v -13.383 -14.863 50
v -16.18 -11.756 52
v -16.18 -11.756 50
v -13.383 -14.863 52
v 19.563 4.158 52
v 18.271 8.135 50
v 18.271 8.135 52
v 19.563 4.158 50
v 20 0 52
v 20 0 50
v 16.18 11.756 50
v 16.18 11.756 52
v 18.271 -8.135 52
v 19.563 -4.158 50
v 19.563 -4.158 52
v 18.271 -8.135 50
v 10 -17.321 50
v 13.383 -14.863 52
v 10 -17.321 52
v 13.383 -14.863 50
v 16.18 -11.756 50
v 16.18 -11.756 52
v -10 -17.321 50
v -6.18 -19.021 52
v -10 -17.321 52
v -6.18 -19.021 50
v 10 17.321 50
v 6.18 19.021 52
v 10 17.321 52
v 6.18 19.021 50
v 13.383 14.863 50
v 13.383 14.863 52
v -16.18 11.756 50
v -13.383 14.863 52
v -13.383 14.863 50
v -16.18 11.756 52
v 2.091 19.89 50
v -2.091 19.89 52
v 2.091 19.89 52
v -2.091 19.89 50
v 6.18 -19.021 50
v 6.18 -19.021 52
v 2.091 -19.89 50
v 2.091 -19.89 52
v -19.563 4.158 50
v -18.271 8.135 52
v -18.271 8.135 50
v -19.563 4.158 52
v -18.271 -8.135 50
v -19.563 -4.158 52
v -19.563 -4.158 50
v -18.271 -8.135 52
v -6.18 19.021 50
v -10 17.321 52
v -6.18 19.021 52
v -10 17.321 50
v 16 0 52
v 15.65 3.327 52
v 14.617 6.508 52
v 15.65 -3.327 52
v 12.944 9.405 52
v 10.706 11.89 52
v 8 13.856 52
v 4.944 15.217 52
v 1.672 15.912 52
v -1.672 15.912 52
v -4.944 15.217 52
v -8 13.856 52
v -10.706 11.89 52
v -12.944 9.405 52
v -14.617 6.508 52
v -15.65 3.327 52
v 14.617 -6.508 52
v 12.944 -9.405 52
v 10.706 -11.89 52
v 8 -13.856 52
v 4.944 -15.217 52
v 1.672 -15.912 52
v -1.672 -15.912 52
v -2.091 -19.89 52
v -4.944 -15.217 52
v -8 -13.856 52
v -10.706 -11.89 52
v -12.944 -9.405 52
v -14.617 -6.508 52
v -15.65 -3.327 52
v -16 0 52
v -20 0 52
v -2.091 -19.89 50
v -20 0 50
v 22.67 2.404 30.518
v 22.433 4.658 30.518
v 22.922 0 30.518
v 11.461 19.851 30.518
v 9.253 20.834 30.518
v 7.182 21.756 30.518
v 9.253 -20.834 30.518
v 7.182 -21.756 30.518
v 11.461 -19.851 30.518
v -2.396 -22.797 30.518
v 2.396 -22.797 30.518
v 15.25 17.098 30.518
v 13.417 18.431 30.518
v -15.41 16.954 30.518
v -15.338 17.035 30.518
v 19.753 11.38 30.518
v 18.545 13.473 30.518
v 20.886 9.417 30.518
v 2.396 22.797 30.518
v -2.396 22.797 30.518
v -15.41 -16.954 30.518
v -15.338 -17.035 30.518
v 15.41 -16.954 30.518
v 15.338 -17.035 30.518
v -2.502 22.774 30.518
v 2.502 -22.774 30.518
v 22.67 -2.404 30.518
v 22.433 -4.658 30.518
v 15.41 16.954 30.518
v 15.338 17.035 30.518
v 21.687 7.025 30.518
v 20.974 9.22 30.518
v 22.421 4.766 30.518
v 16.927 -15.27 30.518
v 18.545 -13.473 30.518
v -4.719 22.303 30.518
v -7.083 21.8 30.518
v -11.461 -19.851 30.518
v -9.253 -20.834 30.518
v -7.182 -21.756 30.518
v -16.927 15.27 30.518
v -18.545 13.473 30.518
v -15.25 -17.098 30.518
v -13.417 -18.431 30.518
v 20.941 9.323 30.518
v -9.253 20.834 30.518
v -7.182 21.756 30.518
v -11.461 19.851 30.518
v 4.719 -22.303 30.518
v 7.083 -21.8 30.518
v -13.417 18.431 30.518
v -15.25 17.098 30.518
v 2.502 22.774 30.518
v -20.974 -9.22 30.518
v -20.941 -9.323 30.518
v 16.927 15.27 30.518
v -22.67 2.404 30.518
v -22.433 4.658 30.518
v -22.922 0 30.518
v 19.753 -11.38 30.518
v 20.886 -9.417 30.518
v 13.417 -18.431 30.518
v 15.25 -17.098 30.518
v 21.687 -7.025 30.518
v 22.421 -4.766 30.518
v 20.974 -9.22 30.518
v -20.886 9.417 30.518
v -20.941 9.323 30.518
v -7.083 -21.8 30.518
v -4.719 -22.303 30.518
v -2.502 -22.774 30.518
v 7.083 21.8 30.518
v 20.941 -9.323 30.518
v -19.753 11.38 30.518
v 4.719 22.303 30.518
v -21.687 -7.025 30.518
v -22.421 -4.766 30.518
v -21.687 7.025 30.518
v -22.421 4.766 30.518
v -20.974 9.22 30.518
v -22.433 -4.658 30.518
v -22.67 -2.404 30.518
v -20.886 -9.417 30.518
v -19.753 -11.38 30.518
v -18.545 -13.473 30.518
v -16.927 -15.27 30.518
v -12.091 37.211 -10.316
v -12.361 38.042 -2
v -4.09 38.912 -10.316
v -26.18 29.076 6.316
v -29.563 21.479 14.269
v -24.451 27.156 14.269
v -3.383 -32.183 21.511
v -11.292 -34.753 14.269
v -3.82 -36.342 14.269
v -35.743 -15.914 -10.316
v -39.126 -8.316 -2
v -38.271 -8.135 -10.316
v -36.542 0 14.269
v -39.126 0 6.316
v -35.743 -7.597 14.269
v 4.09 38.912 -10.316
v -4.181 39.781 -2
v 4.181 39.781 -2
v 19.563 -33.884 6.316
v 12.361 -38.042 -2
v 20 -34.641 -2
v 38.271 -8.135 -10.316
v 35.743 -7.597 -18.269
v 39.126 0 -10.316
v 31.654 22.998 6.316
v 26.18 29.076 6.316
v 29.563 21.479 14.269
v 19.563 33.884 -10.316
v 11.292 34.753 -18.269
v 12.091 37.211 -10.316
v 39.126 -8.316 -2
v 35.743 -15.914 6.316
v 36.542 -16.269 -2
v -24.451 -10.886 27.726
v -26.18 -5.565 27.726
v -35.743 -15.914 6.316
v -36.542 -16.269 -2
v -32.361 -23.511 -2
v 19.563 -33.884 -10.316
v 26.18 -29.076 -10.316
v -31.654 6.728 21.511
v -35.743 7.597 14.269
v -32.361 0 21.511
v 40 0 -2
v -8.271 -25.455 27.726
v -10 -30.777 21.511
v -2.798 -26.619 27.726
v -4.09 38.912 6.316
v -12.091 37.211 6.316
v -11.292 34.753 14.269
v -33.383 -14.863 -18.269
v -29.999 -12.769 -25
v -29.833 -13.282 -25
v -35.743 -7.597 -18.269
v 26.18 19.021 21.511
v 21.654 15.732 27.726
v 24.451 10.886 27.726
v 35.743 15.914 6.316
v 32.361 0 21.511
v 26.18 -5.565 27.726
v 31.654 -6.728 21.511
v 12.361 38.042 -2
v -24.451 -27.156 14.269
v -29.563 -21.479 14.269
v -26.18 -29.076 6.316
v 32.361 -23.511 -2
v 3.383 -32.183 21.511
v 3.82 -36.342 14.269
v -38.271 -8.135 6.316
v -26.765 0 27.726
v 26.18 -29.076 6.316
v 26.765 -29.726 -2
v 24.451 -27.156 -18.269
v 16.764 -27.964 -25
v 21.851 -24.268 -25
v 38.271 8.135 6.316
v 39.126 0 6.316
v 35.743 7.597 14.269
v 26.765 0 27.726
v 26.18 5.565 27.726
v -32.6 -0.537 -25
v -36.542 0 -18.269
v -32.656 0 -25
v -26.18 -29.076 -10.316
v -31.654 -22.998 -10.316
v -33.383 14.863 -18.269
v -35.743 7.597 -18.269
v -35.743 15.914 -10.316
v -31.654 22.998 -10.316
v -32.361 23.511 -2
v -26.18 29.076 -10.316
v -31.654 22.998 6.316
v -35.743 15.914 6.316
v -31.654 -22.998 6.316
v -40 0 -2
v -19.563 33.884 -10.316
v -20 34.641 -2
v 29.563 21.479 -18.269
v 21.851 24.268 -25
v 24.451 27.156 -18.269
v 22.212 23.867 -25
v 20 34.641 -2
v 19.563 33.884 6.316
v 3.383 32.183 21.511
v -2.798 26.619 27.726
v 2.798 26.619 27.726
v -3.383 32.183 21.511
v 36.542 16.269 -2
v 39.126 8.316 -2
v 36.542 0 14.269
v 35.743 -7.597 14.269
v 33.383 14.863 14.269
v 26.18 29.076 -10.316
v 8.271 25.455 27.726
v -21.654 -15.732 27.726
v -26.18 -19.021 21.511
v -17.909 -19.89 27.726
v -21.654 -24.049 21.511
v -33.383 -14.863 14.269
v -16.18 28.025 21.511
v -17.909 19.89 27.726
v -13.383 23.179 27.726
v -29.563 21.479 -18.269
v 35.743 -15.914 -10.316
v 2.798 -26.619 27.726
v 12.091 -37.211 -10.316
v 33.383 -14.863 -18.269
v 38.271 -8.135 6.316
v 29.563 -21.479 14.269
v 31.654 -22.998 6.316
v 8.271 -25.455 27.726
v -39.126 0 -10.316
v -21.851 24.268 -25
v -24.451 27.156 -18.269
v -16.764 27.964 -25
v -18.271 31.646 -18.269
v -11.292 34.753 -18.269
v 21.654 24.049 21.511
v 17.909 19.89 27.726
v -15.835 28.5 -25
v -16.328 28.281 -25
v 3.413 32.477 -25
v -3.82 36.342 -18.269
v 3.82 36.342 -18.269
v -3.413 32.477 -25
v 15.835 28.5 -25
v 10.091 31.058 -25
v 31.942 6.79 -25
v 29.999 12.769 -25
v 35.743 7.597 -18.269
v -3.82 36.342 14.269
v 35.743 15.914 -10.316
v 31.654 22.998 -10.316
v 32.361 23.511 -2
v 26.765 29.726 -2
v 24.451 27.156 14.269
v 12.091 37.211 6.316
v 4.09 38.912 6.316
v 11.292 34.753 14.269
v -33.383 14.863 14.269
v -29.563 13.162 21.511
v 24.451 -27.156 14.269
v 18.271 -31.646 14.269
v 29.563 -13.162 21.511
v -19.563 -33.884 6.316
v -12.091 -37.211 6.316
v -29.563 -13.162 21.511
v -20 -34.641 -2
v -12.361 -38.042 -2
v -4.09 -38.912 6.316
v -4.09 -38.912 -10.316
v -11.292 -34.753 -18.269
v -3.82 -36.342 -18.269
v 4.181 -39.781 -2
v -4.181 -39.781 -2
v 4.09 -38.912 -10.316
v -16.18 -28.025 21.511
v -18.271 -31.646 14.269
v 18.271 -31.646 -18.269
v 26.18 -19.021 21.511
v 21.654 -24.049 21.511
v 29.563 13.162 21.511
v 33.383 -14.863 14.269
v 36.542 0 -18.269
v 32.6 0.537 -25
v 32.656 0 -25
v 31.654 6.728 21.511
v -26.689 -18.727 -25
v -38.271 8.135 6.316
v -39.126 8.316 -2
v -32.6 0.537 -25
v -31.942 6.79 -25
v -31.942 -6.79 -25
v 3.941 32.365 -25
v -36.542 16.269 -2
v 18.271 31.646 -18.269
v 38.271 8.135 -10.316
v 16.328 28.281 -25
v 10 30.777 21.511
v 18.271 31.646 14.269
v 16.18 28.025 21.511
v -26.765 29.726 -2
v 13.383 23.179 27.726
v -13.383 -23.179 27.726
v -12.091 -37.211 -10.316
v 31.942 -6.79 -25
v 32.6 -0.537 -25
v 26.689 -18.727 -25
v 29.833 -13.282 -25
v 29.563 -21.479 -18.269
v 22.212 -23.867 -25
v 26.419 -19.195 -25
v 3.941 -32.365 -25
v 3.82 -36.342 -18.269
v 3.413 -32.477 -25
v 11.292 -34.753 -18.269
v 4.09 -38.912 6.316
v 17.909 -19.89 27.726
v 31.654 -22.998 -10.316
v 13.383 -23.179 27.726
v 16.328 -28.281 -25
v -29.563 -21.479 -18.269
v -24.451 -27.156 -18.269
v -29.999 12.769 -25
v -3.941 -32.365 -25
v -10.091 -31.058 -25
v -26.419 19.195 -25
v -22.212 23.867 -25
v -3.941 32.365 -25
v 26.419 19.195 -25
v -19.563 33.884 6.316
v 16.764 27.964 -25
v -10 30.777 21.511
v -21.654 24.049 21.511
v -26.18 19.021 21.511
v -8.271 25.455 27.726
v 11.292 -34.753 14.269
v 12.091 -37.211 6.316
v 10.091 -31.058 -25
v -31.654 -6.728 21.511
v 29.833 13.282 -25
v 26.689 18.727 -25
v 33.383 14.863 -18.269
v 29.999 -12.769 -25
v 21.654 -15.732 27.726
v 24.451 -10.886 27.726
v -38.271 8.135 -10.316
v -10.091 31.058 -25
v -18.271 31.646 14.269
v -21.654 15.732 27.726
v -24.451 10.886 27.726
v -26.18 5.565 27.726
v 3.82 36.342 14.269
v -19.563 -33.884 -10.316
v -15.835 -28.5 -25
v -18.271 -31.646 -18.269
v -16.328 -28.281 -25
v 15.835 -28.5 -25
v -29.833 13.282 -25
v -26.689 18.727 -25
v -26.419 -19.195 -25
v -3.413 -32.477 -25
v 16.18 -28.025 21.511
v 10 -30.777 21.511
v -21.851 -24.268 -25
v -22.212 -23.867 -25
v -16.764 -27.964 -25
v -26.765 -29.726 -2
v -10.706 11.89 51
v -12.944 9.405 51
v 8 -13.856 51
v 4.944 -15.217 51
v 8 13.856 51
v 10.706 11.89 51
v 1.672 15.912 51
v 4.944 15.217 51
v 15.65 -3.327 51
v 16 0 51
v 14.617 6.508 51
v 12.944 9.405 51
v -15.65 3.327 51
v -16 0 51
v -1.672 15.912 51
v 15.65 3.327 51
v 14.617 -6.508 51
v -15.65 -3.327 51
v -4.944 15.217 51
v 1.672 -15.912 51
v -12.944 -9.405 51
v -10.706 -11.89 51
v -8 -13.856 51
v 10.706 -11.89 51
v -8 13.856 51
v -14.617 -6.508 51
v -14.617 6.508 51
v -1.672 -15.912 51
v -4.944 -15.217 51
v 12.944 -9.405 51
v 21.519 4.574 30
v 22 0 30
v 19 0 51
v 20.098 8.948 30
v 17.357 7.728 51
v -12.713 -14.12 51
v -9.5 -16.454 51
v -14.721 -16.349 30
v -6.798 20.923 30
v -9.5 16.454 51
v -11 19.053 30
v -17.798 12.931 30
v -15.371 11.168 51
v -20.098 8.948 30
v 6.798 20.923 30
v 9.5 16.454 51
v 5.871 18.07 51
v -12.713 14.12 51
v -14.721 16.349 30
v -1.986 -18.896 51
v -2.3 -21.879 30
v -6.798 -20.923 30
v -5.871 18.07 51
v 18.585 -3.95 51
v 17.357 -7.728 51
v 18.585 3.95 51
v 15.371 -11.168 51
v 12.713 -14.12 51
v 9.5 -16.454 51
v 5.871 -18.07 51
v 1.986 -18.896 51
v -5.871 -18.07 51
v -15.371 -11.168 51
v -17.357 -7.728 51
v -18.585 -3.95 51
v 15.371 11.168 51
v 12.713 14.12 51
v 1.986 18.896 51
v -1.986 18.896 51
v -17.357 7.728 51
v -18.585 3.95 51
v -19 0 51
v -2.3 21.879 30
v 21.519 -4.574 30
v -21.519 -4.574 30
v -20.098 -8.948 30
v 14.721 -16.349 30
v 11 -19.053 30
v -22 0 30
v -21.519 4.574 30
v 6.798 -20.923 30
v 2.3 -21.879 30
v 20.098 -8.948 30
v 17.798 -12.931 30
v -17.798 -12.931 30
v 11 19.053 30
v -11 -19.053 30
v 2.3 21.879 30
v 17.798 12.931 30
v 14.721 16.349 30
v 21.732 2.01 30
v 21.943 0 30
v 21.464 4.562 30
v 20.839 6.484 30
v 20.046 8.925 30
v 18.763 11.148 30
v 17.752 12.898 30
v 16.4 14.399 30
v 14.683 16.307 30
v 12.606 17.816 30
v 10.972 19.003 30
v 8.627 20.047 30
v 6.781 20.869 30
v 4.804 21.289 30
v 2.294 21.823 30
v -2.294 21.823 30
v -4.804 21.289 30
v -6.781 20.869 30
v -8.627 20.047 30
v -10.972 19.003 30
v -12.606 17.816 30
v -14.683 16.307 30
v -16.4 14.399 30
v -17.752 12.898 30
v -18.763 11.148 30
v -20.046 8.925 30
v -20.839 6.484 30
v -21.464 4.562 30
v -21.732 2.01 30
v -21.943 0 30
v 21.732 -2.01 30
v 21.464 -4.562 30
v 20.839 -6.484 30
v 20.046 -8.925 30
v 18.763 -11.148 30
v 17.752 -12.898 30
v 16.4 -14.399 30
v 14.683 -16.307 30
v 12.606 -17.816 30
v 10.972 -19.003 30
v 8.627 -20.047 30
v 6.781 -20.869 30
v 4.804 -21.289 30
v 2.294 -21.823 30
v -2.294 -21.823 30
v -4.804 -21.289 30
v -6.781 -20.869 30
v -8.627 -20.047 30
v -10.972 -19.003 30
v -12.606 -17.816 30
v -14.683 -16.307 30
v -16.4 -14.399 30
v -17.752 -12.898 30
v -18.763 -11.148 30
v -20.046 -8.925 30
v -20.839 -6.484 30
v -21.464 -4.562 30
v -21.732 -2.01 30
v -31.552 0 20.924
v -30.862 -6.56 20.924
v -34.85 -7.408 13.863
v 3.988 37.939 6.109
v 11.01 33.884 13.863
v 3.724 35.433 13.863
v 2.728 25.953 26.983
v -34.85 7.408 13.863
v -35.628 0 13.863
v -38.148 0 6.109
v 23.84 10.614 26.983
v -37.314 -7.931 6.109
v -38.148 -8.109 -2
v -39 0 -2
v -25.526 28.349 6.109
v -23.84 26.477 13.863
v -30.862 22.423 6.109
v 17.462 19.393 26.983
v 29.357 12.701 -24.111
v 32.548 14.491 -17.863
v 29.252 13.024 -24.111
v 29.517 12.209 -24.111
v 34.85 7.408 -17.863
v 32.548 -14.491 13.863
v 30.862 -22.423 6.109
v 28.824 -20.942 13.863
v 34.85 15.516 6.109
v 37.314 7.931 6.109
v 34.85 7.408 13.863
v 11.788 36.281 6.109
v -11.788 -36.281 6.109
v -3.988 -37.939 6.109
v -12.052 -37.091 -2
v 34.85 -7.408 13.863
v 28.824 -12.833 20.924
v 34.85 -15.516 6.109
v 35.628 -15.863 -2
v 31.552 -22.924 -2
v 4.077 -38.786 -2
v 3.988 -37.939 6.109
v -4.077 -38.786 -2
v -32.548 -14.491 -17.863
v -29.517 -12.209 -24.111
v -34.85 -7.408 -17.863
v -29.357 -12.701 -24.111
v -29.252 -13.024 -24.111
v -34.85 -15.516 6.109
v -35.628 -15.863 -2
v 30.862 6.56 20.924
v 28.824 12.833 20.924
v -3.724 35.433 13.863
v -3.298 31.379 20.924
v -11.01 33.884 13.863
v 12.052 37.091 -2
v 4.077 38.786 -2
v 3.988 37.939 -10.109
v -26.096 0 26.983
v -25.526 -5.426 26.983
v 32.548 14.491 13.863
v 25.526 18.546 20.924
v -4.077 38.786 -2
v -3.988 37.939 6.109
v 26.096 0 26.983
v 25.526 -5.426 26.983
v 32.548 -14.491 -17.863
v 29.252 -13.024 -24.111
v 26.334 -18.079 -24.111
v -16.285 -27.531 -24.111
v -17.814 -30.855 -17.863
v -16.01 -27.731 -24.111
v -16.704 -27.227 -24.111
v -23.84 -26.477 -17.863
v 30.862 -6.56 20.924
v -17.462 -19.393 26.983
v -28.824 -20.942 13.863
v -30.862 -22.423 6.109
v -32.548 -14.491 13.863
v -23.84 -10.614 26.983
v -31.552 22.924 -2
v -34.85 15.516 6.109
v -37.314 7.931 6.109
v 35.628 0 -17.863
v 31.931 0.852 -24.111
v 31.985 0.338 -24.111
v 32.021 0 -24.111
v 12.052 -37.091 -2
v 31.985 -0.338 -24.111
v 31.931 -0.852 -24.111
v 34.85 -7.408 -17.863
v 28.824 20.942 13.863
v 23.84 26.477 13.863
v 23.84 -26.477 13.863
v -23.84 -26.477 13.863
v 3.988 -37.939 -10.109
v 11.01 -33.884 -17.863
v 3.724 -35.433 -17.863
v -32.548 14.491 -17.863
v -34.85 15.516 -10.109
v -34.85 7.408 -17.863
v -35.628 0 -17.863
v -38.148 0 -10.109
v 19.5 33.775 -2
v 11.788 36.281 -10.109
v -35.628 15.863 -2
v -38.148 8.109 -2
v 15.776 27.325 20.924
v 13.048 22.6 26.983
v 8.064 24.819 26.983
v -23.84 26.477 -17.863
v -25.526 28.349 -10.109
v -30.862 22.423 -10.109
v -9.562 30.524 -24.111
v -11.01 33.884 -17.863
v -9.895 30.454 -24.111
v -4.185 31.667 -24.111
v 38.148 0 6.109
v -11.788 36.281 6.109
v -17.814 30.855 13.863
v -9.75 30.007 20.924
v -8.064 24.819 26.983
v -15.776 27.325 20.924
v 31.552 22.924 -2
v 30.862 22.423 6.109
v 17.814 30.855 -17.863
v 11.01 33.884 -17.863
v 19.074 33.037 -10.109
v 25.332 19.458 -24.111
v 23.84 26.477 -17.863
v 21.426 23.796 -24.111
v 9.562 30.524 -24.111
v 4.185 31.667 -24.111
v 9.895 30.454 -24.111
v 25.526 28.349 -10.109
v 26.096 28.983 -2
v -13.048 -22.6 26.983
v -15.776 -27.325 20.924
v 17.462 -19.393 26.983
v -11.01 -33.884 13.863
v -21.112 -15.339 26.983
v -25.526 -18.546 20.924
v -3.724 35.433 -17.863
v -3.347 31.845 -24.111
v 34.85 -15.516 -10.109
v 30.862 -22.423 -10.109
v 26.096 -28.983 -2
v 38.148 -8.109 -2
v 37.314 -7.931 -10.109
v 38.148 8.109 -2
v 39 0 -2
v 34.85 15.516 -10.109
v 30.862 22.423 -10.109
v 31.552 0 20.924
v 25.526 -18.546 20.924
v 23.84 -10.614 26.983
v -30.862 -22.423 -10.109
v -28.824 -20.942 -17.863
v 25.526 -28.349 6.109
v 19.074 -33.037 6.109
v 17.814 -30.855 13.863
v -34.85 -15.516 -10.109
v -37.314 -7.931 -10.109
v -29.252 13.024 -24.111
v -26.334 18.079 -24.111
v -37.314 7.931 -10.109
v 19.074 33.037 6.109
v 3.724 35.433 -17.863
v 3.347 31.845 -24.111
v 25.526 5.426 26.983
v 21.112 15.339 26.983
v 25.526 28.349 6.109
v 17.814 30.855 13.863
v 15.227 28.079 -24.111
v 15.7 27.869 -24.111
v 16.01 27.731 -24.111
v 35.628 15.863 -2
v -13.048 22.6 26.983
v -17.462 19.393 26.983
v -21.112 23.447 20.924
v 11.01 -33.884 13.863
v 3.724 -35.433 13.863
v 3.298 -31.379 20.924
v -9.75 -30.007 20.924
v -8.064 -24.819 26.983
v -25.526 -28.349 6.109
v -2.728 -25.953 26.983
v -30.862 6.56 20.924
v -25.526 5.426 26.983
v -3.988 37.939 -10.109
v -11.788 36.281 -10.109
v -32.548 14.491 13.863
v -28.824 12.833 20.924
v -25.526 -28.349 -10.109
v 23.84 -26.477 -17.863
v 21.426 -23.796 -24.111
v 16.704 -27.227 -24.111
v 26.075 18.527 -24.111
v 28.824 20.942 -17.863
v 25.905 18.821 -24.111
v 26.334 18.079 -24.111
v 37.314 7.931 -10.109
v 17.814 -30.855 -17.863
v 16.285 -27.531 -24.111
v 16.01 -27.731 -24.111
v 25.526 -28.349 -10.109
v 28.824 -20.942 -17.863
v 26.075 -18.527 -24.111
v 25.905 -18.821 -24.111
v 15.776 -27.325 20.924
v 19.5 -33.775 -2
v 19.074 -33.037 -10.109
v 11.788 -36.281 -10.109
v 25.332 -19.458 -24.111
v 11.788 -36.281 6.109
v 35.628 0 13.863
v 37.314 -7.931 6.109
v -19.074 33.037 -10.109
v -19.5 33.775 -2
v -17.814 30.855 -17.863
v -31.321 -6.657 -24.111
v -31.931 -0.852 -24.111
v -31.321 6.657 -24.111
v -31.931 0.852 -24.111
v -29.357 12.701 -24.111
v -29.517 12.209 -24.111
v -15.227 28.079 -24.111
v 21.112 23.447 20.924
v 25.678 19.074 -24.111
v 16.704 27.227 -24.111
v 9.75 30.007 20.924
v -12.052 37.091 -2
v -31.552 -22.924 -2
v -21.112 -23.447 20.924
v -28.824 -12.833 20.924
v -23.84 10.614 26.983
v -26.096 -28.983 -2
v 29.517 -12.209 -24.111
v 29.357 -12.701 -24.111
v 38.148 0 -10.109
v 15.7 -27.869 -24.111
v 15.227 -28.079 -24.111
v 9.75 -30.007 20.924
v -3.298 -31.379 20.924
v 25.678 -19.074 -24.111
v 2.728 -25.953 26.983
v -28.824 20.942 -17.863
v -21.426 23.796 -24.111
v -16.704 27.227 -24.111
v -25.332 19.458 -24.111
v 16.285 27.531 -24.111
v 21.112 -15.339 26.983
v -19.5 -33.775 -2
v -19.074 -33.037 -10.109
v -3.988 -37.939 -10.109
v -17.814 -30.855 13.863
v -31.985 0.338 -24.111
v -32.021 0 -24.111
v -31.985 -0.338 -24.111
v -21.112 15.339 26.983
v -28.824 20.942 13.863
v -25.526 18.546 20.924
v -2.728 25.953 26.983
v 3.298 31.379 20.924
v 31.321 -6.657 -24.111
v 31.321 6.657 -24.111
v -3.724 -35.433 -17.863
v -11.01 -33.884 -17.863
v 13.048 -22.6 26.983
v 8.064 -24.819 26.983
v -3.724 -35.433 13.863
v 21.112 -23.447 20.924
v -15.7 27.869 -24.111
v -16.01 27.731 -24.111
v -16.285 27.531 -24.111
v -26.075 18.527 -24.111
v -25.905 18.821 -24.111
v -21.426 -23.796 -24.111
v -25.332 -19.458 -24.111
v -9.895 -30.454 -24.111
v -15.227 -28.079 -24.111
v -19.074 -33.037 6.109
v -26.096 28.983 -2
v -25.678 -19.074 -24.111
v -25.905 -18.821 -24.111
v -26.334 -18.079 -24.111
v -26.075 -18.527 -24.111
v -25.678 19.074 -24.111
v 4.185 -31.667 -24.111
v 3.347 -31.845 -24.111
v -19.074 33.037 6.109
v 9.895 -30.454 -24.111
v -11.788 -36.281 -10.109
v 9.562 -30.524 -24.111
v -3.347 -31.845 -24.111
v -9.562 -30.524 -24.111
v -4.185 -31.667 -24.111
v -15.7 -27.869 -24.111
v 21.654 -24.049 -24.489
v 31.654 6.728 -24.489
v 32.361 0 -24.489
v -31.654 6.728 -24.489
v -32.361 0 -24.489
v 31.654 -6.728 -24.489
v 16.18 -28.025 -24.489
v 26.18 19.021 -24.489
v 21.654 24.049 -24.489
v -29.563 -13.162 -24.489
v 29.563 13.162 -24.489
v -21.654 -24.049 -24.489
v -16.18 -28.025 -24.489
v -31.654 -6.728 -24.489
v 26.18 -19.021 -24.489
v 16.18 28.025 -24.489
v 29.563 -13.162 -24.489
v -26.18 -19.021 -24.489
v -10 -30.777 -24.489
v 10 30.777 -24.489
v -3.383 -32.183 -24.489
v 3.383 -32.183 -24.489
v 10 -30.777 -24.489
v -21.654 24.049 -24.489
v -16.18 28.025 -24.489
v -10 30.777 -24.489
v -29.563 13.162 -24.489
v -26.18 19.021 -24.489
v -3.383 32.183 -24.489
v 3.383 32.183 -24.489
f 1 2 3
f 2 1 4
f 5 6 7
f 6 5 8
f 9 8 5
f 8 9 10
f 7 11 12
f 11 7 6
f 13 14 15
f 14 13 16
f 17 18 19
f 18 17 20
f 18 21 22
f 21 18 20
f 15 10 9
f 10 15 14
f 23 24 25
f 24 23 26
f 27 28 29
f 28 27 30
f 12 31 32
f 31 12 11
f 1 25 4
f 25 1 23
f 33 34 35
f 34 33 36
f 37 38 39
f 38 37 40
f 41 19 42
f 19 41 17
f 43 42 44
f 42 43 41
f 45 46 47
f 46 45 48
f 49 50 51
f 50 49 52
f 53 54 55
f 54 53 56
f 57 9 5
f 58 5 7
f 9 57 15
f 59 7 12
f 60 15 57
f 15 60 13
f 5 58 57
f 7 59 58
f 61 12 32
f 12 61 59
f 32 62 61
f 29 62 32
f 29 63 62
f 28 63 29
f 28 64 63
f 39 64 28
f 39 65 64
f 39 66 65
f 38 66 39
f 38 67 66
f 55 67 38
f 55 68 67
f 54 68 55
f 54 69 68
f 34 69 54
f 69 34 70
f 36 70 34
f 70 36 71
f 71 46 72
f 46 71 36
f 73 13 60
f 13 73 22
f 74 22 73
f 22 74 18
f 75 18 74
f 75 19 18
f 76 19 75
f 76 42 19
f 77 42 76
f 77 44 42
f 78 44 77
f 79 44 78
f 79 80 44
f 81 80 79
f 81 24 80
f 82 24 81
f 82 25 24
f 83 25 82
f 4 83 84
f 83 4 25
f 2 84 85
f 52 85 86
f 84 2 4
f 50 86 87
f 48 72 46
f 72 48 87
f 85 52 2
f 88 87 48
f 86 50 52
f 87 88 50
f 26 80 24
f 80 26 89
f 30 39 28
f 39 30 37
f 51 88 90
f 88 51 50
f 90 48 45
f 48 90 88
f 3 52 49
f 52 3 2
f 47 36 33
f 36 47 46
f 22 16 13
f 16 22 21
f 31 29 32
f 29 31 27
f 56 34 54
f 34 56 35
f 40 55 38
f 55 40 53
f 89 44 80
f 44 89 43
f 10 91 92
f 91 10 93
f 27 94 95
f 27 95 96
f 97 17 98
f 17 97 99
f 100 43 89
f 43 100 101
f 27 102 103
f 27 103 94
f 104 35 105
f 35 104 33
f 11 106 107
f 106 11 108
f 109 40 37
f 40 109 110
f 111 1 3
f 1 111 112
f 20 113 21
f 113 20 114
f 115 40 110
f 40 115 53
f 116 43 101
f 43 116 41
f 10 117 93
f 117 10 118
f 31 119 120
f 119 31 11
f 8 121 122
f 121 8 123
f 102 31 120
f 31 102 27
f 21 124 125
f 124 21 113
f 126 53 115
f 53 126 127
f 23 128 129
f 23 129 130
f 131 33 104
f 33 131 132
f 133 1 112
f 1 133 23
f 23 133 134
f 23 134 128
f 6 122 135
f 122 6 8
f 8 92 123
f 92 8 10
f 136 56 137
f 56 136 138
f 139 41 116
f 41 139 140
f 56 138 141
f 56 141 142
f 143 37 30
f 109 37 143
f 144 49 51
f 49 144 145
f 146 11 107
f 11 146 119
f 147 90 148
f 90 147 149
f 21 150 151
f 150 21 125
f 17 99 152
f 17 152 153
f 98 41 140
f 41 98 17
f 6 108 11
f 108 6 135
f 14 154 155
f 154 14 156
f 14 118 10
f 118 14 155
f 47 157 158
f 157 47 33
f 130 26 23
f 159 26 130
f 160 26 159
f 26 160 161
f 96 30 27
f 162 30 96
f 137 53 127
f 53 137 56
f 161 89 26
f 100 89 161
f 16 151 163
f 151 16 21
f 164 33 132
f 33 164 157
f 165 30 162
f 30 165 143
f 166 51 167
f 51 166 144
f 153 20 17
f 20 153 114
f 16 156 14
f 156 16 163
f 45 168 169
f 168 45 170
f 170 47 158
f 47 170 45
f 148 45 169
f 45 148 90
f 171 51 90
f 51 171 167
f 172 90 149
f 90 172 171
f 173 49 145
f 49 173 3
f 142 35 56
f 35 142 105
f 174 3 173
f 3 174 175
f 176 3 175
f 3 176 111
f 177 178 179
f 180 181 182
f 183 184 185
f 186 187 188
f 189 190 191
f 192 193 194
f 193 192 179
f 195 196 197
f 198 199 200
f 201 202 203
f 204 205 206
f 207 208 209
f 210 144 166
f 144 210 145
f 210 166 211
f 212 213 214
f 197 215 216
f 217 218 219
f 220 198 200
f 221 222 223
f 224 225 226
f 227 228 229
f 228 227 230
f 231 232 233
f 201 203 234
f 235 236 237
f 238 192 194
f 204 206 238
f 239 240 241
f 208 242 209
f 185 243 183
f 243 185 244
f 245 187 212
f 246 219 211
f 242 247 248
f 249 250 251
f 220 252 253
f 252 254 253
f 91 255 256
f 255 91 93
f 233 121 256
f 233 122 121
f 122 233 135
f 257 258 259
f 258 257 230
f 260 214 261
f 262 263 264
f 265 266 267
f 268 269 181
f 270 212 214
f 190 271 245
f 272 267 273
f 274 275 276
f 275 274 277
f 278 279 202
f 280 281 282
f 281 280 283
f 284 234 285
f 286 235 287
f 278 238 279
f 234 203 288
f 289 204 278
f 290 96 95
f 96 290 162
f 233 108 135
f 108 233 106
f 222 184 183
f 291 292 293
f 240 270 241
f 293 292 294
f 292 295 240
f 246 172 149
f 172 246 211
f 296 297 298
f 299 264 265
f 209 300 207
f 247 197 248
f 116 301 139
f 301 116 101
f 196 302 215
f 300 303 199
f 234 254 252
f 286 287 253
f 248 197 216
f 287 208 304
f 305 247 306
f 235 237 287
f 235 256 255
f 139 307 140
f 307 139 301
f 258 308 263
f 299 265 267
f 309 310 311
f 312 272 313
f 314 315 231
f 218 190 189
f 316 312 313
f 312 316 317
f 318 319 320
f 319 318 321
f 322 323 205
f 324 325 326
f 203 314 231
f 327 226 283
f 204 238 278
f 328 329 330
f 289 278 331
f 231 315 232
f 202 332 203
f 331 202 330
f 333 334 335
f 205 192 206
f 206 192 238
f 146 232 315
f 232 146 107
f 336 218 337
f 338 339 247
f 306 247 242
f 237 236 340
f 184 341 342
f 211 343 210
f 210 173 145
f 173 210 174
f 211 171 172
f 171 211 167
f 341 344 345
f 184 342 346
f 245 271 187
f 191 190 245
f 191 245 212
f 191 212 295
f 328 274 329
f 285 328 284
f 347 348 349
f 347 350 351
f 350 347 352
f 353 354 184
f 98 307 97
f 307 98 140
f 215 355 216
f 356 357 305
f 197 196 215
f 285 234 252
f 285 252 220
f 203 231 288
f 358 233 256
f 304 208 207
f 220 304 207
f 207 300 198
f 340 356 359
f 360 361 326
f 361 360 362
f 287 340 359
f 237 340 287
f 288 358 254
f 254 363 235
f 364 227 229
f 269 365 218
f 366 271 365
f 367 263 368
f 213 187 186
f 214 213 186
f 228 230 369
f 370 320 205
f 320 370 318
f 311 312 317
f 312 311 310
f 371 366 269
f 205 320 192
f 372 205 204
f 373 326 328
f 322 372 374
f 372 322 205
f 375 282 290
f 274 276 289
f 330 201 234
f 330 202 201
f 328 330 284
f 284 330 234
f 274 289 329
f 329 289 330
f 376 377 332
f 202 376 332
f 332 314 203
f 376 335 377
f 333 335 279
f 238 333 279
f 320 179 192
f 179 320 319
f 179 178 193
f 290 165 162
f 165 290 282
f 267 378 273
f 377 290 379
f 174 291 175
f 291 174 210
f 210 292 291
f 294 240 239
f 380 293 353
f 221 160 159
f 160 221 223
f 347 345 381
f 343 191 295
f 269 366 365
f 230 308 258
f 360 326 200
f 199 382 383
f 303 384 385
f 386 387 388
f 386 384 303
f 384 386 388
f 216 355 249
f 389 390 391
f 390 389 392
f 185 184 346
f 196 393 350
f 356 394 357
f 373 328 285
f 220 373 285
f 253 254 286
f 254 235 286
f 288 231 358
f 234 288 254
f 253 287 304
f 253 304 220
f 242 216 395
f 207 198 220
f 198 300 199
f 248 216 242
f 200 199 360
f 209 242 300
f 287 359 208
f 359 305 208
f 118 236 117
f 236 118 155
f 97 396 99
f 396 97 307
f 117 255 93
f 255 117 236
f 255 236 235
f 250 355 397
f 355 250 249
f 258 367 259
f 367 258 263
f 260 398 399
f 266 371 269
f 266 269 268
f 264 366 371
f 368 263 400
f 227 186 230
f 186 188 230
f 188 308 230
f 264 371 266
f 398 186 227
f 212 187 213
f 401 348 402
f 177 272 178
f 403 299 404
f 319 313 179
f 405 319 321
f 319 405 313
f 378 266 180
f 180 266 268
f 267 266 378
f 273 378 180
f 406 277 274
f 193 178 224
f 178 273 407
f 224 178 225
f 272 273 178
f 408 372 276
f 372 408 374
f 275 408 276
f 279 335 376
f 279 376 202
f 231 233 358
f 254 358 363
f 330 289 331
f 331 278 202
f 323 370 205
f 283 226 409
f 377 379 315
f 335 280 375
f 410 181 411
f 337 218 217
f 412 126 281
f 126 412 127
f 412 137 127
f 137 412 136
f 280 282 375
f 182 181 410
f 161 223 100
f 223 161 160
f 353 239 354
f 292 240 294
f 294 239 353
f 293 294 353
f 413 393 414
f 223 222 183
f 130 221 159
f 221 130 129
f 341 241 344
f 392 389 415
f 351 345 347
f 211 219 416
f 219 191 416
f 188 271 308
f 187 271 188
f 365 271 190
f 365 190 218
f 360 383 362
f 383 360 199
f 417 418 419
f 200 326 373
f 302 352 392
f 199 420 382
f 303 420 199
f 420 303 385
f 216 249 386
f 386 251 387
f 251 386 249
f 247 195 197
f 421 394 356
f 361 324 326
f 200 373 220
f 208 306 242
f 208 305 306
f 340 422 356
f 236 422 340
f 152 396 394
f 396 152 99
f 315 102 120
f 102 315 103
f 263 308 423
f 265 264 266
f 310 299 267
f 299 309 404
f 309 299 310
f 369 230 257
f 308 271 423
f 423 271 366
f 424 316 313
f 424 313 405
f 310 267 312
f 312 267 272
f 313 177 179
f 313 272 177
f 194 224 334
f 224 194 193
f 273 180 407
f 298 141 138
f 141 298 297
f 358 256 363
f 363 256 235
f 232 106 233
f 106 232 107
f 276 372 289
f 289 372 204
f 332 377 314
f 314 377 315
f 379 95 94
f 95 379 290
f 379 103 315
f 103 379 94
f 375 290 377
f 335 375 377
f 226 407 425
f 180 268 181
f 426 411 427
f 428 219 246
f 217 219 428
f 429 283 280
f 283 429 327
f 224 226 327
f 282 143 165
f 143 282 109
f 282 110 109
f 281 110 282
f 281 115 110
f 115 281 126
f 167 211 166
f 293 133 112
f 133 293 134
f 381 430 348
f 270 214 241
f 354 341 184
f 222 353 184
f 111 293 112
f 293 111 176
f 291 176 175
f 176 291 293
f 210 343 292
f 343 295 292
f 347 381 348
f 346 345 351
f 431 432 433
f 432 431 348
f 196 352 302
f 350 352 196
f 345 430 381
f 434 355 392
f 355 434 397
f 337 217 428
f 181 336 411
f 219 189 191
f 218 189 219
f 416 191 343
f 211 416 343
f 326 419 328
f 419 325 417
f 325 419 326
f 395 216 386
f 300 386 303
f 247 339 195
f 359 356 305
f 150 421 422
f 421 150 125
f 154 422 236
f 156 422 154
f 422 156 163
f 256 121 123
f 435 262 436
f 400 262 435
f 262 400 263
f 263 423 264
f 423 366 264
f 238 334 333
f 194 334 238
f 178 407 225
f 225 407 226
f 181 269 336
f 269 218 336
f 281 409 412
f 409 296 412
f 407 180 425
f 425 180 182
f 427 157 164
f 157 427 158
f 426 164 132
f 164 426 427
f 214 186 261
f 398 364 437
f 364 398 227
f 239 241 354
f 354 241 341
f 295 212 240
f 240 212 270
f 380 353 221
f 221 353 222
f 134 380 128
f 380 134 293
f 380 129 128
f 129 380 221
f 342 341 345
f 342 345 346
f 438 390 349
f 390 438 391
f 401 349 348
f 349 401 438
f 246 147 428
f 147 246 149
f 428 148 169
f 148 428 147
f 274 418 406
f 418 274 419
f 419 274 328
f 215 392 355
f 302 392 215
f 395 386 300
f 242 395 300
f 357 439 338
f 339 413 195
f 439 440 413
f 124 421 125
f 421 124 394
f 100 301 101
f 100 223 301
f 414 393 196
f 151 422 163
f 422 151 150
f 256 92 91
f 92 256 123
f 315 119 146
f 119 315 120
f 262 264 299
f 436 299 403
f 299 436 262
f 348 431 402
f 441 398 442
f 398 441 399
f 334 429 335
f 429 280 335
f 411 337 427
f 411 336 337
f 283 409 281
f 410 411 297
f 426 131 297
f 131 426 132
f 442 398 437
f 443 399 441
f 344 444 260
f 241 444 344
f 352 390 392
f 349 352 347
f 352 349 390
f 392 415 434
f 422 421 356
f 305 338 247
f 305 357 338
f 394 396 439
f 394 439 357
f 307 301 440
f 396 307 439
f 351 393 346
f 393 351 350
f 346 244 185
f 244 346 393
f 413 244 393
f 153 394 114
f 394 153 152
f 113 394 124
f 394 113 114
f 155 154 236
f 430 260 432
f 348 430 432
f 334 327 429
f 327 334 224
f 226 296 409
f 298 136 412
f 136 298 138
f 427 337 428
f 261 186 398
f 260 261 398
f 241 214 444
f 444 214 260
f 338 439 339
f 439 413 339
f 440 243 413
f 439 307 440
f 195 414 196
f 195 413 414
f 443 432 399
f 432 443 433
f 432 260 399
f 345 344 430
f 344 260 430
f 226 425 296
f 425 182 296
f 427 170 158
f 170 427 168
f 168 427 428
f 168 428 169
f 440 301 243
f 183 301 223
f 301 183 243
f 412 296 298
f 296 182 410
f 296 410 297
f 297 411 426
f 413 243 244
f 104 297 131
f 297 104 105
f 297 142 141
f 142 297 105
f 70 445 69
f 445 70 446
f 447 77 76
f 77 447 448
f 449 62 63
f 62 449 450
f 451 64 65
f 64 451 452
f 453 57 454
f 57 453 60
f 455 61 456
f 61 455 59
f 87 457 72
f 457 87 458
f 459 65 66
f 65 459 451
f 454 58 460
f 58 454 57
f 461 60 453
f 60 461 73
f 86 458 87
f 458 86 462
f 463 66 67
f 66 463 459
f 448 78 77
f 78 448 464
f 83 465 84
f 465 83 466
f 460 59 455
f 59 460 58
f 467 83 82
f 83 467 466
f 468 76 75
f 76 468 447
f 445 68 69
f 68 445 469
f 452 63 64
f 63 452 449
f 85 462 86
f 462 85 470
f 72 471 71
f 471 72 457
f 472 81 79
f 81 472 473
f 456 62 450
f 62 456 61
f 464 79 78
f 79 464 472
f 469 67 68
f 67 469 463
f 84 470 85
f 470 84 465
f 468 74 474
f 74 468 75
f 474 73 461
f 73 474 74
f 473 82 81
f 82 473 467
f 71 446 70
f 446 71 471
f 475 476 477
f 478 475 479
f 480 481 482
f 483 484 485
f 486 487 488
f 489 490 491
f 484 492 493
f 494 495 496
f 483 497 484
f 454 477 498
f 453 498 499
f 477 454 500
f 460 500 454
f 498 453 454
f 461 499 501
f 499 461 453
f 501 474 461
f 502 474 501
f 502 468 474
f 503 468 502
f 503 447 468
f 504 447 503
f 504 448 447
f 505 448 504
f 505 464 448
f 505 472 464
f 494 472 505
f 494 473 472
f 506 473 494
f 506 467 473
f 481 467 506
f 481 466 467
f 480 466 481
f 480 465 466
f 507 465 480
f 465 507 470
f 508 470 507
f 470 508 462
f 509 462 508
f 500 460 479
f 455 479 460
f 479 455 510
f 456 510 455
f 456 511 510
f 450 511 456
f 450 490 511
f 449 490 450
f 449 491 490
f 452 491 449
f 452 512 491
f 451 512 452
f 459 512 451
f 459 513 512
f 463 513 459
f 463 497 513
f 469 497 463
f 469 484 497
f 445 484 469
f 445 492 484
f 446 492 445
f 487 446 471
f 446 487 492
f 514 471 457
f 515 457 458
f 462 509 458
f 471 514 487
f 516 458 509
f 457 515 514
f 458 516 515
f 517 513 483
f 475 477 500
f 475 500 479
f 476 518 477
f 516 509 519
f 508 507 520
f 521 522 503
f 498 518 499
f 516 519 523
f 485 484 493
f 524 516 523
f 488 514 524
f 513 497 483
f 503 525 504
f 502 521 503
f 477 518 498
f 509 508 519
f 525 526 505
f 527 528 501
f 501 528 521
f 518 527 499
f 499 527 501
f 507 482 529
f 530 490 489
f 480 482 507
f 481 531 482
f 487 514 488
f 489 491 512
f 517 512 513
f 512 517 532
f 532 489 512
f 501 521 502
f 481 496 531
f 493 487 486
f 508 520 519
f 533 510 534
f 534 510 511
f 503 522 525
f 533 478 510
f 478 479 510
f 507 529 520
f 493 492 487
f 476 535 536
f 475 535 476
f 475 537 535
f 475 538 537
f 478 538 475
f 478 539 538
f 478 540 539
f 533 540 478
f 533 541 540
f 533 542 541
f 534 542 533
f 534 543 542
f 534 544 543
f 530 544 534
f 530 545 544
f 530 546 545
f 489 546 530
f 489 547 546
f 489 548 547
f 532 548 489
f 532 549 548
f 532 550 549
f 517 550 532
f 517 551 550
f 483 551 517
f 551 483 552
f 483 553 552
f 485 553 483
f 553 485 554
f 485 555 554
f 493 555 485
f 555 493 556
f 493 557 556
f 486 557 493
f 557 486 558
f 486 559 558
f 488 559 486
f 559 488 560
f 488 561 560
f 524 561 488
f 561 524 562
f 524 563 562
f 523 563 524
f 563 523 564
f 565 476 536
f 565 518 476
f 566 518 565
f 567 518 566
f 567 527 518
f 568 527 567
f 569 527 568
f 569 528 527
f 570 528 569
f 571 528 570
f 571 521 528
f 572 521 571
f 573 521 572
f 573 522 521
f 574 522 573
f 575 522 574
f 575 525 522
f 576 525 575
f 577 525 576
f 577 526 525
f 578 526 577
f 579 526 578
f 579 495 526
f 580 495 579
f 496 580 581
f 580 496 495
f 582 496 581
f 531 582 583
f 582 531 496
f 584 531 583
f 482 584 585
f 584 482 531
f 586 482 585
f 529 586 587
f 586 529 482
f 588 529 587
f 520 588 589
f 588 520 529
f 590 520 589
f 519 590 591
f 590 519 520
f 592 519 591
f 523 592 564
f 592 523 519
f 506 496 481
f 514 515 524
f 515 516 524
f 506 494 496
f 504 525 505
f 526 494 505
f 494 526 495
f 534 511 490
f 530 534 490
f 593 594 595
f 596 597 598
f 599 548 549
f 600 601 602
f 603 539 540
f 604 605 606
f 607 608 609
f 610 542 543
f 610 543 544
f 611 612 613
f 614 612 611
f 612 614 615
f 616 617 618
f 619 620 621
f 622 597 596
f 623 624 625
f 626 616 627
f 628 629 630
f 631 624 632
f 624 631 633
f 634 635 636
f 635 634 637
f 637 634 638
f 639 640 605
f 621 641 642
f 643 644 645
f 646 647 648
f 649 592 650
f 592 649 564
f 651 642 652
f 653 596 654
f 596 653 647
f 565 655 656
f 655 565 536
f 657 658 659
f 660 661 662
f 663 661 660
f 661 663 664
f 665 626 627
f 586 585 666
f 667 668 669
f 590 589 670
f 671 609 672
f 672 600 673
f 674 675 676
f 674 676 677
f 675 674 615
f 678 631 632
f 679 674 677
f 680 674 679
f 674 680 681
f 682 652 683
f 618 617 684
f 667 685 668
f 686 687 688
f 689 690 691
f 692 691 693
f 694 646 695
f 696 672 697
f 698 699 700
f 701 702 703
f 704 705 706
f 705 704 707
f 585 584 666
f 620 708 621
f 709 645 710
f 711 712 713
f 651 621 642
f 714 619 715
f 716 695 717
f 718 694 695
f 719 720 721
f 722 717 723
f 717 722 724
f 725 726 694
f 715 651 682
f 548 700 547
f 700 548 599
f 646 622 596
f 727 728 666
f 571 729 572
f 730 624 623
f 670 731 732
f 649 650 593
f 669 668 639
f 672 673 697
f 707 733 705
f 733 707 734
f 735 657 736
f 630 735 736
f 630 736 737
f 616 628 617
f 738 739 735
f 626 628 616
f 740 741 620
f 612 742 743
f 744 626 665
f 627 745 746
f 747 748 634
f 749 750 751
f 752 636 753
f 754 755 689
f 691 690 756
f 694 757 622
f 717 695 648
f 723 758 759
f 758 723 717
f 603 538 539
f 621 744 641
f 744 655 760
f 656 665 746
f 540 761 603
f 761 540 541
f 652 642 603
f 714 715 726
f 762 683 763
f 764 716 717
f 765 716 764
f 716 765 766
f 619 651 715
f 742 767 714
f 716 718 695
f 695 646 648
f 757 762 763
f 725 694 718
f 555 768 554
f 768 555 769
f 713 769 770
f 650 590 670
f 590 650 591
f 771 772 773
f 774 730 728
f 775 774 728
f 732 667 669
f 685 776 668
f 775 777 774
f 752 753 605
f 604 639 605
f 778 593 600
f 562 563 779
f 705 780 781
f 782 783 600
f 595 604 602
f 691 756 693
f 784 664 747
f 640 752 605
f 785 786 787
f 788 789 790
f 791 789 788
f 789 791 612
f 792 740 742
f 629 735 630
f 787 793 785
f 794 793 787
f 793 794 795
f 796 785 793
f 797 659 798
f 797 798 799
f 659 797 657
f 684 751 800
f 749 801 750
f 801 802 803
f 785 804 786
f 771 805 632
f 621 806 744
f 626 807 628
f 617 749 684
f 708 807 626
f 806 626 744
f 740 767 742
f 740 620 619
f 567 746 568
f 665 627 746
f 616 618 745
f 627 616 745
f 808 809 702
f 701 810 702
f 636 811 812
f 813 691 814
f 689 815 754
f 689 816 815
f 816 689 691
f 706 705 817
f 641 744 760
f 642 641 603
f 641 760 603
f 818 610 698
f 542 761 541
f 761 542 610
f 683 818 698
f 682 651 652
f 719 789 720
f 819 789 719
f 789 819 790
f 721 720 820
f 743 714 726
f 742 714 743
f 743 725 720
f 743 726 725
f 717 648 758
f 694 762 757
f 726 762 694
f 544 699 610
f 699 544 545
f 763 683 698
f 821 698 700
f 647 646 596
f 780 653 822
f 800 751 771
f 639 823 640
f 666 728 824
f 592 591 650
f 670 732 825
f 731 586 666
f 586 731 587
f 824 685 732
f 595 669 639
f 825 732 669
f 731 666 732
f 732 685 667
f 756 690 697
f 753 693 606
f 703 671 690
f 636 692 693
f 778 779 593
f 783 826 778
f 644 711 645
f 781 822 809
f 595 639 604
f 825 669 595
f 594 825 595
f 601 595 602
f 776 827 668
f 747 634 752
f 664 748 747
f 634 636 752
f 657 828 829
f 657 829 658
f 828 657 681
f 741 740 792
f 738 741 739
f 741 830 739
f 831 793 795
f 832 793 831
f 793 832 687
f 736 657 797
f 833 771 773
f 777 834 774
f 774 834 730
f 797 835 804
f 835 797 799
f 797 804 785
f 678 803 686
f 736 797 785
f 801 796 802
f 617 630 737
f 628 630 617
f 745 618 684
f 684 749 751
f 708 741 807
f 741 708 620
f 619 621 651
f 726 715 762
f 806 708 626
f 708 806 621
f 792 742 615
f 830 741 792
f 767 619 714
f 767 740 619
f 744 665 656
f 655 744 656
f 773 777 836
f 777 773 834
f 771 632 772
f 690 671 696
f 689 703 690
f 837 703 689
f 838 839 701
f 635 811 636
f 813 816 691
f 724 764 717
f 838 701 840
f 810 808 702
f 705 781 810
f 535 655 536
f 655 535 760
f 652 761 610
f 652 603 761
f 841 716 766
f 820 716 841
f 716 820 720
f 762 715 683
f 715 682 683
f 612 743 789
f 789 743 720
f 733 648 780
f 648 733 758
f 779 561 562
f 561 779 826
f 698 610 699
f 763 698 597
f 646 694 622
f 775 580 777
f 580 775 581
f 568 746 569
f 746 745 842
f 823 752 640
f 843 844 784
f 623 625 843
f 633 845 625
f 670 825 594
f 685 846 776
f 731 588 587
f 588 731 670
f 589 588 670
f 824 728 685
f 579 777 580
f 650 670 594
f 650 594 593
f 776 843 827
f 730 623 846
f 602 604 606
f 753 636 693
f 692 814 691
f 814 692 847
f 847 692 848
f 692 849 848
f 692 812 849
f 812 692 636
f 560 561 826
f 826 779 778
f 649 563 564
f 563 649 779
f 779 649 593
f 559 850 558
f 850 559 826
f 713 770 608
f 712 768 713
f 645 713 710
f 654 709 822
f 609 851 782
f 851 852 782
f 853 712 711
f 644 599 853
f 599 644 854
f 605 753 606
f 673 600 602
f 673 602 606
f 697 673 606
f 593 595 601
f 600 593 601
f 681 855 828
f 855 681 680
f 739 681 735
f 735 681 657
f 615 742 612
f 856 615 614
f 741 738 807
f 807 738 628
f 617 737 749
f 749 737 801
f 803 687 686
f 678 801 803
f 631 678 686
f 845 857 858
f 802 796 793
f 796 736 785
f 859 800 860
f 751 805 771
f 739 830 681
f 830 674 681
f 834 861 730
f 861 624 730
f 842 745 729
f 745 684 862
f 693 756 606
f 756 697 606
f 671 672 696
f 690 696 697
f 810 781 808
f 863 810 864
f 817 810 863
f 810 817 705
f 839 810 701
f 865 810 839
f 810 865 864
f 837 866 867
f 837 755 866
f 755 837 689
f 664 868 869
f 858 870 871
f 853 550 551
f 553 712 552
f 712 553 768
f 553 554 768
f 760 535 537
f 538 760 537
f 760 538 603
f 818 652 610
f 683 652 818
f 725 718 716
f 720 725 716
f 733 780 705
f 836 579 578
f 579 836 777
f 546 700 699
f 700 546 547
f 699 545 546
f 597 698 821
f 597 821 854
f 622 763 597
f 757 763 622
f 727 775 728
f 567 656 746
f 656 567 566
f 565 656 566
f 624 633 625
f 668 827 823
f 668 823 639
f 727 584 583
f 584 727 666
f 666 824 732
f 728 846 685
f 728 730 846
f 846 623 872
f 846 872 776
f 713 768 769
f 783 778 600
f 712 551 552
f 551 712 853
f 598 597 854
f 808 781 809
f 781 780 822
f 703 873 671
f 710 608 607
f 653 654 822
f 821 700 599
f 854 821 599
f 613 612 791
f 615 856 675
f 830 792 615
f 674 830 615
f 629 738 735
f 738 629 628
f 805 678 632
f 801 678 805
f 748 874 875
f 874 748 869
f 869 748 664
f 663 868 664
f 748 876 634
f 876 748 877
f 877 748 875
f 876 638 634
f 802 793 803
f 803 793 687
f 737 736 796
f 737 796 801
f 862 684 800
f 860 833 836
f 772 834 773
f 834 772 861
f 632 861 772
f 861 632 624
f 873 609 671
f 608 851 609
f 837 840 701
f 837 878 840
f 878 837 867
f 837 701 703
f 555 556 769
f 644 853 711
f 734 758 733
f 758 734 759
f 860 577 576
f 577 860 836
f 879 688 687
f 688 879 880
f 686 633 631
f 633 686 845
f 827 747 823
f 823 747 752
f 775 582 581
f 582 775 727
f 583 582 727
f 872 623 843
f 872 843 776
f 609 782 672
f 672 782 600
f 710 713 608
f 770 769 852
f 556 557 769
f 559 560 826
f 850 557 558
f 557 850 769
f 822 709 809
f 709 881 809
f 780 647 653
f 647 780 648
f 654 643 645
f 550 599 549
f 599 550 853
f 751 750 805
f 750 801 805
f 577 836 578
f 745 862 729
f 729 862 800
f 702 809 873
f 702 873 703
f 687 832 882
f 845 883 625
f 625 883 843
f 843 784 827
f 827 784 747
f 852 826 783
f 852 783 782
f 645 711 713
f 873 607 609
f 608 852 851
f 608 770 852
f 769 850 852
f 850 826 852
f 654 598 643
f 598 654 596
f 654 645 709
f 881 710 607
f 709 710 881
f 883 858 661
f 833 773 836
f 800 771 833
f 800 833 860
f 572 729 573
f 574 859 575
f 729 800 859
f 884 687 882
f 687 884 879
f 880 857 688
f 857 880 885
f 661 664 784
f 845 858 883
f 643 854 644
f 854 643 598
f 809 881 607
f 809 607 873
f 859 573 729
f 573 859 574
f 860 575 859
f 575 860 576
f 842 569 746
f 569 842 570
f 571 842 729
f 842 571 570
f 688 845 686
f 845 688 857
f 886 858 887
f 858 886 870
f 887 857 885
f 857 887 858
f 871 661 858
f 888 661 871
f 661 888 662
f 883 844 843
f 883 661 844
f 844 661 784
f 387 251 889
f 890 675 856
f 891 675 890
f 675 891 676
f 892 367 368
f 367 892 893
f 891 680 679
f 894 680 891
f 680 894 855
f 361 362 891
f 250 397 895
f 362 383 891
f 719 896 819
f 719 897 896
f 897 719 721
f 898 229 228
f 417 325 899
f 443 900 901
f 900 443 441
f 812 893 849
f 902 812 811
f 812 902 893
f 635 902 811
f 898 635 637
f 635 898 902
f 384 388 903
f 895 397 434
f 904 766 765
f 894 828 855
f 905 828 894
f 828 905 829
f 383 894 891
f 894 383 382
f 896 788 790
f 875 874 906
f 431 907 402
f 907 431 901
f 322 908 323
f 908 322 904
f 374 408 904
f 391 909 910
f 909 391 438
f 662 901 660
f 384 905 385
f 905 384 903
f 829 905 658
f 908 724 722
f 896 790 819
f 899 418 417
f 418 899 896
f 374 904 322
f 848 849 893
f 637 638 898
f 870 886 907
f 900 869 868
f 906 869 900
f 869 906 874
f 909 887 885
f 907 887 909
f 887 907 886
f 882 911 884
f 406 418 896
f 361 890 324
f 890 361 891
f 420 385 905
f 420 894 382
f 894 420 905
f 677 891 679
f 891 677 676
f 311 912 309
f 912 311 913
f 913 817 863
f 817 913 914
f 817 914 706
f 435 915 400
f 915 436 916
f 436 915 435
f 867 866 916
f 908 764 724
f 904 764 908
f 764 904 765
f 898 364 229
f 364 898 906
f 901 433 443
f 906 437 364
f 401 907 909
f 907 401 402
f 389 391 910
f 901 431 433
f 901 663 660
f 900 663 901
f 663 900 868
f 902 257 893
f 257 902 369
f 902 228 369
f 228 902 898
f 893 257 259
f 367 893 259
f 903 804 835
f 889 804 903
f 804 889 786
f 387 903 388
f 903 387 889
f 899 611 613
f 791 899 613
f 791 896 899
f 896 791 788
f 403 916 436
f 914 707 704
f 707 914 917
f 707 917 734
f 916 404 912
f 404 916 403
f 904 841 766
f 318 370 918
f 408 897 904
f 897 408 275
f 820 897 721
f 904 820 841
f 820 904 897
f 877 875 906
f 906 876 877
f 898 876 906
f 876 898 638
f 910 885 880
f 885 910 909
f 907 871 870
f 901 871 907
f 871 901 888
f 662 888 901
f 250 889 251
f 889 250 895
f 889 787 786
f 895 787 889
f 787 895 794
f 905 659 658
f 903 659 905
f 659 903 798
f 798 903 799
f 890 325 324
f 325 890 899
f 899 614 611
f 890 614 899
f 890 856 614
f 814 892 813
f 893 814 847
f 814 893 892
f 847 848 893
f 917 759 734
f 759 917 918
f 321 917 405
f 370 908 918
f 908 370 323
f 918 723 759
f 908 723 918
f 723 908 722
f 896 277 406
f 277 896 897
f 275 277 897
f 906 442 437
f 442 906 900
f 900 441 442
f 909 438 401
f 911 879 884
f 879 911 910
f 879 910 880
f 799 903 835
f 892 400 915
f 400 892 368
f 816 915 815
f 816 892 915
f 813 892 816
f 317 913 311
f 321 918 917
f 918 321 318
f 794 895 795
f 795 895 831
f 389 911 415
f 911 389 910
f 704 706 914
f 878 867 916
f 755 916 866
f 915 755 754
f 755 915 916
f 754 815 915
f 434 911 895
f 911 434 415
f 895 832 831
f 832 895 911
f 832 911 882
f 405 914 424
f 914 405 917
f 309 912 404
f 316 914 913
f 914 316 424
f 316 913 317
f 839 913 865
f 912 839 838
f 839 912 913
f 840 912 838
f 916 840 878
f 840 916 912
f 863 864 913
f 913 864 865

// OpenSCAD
difference(){
    union(){
        translate([0, 0, 50]) cylinder(h=2,r1=20, r2=20);
        translate([0, 0, 30]) cylinder(h=20,r1=23, r2=20);
        //translate([0, 0, 40]) sphere(r = 40);
        translate([0, 0, -2]) sphere(r = 40);
    }
 
    union(){
        translate([0, 0, 50]) cylinder(h=3,r1=16, r2=16);
        translate([0, 0, 30]) cylinder(h=21,r1=22, r2=19);
        
        //translate([0, 0, 40]) sphere(r = 39);
        translate([0, 0, -2]) sphere(r = 39);        
        translate([0, 0, -48]) sphere(r = 40);
    }
}
